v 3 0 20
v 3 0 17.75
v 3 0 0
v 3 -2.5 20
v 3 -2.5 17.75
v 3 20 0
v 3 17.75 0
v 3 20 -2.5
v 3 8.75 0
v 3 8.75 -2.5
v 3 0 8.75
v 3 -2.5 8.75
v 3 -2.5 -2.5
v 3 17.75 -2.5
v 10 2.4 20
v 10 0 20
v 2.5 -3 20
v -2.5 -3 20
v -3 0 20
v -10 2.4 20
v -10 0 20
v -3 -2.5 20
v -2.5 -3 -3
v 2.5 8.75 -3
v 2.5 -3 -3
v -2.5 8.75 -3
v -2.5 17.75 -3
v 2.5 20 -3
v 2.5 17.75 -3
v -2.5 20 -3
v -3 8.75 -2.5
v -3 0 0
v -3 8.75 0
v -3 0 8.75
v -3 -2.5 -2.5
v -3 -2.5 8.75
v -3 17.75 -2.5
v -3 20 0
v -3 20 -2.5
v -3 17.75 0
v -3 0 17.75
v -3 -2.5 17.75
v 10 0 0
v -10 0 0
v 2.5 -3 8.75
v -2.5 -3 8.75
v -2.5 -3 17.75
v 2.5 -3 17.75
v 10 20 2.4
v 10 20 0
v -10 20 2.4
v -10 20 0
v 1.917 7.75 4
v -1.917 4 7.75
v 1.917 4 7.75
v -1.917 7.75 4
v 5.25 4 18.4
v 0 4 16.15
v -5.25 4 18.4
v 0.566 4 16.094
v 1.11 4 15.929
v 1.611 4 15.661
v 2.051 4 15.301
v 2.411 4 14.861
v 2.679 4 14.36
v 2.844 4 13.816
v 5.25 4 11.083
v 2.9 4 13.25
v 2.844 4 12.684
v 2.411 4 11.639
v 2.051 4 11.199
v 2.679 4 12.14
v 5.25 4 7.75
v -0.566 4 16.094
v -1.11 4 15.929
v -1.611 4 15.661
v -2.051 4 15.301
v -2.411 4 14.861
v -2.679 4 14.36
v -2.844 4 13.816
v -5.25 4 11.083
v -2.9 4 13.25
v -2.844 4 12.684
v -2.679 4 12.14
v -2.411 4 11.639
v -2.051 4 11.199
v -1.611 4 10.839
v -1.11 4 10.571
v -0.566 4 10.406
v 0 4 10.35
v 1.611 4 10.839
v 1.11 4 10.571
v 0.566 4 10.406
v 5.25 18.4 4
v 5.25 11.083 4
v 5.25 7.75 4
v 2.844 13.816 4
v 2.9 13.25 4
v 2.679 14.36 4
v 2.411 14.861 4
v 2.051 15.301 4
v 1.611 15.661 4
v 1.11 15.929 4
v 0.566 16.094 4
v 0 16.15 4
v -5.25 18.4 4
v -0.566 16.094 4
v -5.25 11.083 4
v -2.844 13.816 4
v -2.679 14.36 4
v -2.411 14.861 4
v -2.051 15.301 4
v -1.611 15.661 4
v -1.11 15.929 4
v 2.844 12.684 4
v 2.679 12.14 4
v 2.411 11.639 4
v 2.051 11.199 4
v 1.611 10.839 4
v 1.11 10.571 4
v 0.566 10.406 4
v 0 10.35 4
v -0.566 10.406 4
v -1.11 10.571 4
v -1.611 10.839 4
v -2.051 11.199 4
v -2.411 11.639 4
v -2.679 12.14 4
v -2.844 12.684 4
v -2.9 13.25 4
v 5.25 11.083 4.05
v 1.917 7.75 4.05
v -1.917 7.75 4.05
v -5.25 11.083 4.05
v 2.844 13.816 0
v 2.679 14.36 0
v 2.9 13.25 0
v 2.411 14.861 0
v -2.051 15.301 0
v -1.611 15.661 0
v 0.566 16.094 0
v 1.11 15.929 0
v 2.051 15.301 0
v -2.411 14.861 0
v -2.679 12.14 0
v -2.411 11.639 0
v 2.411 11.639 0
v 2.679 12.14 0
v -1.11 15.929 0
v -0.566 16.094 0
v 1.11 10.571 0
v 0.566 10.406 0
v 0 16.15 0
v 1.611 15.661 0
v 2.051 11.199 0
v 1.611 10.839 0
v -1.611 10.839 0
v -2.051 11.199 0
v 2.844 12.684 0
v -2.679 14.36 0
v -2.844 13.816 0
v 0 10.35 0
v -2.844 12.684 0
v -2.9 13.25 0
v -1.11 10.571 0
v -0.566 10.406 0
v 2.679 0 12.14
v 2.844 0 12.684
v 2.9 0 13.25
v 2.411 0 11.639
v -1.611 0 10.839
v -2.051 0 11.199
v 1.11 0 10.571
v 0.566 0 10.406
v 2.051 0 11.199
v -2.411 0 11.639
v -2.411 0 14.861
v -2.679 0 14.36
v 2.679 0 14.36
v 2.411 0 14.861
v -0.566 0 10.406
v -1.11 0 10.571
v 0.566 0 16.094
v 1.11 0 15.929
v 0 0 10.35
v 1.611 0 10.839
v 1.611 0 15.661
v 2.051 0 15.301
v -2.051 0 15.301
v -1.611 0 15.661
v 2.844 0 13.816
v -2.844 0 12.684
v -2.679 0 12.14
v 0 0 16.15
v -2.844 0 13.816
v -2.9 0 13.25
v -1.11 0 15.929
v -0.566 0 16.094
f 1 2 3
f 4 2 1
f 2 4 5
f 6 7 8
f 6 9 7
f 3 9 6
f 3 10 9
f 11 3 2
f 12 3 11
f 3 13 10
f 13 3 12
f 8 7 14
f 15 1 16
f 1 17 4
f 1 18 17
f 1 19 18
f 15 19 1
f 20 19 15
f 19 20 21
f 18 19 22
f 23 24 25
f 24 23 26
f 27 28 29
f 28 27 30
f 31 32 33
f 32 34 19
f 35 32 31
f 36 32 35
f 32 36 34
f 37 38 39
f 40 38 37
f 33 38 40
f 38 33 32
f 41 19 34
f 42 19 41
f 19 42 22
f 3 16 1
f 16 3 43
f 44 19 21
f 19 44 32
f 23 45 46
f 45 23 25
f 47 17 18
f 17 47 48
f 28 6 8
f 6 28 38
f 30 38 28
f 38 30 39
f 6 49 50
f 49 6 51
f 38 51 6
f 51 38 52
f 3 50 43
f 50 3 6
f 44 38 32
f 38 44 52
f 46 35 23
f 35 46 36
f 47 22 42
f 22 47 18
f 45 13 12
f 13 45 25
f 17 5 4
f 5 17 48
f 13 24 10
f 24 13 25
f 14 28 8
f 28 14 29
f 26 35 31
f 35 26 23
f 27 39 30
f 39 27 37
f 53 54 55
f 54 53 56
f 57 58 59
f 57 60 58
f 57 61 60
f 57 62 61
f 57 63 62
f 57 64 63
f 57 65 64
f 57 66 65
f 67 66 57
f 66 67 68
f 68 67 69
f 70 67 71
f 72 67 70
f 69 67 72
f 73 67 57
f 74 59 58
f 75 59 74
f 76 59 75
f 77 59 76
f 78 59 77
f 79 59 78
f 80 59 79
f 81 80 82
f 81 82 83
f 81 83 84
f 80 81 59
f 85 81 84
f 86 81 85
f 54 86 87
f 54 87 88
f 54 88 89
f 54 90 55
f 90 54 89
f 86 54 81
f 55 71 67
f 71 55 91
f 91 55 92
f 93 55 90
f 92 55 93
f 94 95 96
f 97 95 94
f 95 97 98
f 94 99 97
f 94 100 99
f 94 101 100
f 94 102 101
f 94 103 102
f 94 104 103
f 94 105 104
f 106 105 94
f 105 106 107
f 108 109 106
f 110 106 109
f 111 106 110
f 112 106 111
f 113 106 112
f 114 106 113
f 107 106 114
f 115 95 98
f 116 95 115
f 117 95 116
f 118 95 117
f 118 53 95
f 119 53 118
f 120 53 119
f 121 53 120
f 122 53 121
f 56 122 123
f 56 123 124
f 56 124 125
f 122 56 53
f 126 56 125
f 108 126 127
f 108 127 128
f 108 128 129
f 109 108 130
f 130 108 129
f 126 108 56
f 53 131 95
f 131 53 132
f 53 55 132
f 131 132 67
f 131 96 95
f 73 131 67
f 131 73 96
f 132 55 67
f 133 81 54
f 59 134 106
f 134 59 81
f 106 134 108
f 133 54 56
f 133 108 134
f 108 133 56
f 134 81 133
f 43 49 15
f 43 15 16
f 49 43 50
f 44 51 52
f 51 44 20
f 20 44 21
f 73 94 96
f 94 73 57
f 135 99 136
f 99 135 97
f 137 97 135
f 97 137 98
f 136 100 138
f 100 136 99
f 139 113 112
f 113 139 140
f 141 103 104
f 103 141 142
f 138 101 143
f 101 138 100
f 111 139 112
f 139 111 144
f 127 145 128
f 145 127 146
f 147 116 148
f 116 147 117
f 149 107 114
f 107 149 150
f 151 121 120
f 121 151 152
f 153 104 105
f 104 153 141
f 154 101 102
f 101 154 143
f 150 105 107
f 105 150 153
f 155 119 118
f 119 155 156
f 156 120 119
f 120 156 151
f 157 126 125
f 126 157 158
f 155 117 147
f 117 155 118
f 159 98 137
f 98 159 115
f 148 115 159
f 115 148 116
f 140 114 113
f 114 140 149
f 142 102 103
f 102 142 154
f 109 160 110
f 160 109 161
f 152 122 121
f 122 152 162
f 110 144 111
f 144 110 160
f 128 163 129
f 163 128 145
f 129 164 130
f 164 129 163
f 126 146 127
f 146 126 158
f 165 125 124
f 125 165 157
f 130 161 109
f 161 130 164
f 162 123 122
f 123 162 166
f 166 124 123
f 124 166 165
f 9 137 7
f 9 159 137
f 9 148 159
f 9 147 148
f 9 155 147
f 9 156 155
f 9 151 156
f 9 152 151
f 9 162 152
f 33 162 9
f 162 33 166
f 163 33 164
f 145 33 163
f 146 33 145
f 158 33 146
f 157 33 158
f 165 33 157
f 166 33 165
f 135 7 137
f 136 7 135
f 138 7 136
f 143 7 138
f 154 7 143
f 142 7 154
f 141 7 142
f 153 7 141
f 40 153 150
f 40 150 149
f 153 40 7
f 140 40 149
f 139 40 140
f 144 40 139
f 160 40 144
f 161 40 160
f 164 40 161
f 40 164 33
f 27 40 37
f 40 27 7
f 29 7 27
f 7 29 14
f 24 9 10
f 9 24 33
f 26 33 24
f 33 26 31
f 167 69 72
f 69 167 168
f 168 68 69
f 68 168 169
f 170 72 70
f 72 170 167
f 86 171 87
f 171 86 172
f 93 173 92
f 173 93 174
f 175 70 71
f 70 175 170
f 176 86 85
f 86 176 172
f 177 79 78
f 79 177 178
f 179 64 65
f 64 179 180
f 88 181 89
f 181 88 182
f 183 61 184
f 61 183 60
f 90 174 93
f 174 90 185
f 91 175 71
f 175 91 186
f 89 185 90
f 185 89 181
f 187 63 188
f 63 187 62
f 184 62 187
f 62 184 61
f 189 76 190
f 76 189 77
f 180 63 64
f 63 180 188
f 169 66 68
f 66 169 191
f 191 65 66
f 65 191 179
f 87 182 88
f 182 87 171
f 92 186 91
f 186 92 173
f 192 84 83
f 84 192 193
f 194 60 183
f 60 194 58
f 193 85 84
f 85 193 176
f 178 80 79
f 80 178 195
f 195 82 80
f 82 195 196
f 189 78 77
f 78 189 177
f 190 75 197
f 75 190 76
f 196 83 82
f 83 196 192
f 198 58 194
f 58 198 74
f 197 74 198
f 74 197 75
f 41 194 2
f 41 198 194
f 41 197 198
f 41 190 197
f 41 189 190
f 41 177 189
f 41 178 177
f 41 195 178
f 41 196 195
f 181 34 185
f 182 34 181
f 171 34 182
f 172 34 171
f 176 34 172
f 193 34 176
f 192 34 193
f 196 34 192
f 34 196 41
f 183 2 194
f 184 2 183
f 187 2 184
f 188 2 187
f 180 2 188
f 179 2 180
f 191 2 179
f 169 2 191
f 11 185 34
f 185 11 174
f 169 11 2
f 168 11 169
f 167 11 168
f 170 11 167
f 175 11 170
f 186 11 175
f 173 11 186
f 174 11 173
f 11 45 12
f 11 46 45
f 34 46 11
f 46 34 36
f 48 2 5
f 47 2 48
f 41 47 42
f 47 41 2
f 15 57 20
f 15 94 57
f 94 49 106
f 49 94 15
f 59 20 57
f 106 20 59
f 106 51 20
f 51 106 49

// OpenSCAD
/*
* Ultimate Customizable Corner Brackets
* https://www.thingiverse.com/thing:3007147
* Version 1.1
* 2019-11-07
*/


// The width of your aluminium extrusion
extrusion_width = 20;

// The side length of the bracket
side_length = 20;
// The thickness of the parts you screw into
side_thickness = 4;

// How many screws should be used to fasten this to the extrusions. Should be even.
screw_count = 2;
// Screw diameter (4 for M4, 5 for M5 and so on)
screw_hole_size = 5;
// Screw head diameter
screw_head_size = 10;
// How deep screw heads should be recessed. Obviously don't make this larger than side_thickness.
recessed_screw_depth = 0;

// The part which goes into your extrusion. Generally this should be slightly smaller than the actual hole, but YMMV.
extrusion_insert_width = 6;

// Use this when you want multiple connected brackets, for 4020 and similar. 20 for 2020 extrusions, 30 for 3030 and so on.
extrusion_base = 20;

// Set to true if you only want a single wall. Not compatible with multiple bracket mode
single_wall_mode = false;

// Set lower if you think the side walls are too thick
max_wall_thickness = 8;

// Set this if you want to use these above your existing brackets. Typical 2020 brackets have a size of 20 and side thickness of 3
cutout_size = 0;
cutout_side_thickness = 0;
cutout_margin = 0.3;





/**********************************
   End of config, here be dragons
**********************************/








// This works for typical hammer nuts, increase if needed
bottom_nut_space = screw_hole_size + 4;

// You might want to decrease this if you don't use hammer nuts
extrusion_insert_height = 3;

screw_head_margin = 0.5;
e = 0.05;
screw_distance_from_edge = max(screw_head_size / 2 + 1.5, min(6.5, side_length/3)) + screw_head_margin/2;
bridge_size = screw_count > 2
    ? (side_length - side_thickness - 2*screw_head_size + cutout_size + cutout_margin) / (side_length/20)
    : side_length - screw_distance_from_edge - screw_head_size / 2 - side_thickness - screw_head_margin;

main();

module main() {
    bracket_count = floor(extrusion_width / extrusion_base);
    extrusion_width = extrusion_width/bracket_count;
    wall_thickness = min([max_wall_thickness, (extrusion_width - screw_head_size - screw_head_margin) / 2]);
    union() {
        for(i=[0:bracket_count-1]) {
            translate([i*extrusion_width, 0, 0]) bracket(extrusion_width, wall_thickness);
        }
    }
}

module bracket(width, wall_thickness, is_first) {
    screw_total_distance = side_length - screw_distance_from_edge - bridge_size - side_thickness - screw_head_size/2 - screw_head_margin;
    screw_distance = screw_total_distance/(max(1, screw_count/2-1));
    
    difference() {
        union() {
            translate([-width/2, 0, 0]) cube([width, side_length, side_thickness]); // Bottom wall
            translate([-width/2, side_thickness, 0]) rotate([90, 0, 0]) cube([width, side_length, side_thickness]); // Top wall
            translate([width/2 - wall_thickness, 0, 0]) rotate([90, 0, 90]) wall(width, side_length, wall_thickness); // Left wall
            if(!single_wall_mode) {
                translate([-width/2, 0, 0]) rotate([90, 0, 90]) wall(width, side_length, wall_thickness); // Right wall
            }
            
            // Make the parts which go into the extrusions, with chamfers
            difference() {
                union() {
                    extrusion_insert();
                    translate([0, 0, 0]) rotate([90, 0, 180]) extrusion_insert();
                }
                extrusion_chamfer();
                translate([0, 0, 0]) rotate([90, 0, 180]) extrusion_chamfer();
            }
            bridge(bridge_size, width, wall_thickness);
        };
        translate([-width/2 - e, side_length + side_thickness*0.6, 0]) rotate([45, 0, 0]) cube([width + e * 2, side_length, side_length*2]); // Cutoff for better printing
        
        // Make screw holes
        for(i=[0:screw_count/2-1]) {
            translate([0, side_length - screw_distance_from_edge - i*screw_distance, -e]) screw(screw_hole_size, screw_head_size); // Bottom screw
            translate([0, -e, side_length - screw_distance_from_edge - i*screw_distance]) rotate([270, 0, 0]) screw(screw_hole_size, screw_head_size); // Top screw
        }
        cutout();
    }
}

module cutout() {
    zero = -e-extrusion_insert_height;
    full_width = cutout_size+cutout_margin;
    if (cutout_size > 0) translate([extrusion_width/2+e, 0, 0]) rotate([0, -90, 0]) linear_extrude(height = extrusion_width+2*e, convexity = 2) polygon(points = [
        [zero, zero],
        [zero, full_width],
        [cutout_side_thickness+cutout_margin, full_width],
        [full_width, cutout_side_thickness+cutout_margin],
        [full_width, zero]]);
}

module wall(w, l, wall_thickness) {
    linear_extrude(height = wall_thickness, convexity = 2) polygon(points = [[side_thickness, side_thickness], [side_length, side_thickness], [side_thickness, side_length]]);
}

module screw(hole_size, head_size) {
    translate([0,0,-0.5]) cylinder(h = side_thickness + 1, r = hole_size / 2 + 0.4, $fn = 32); // Screw hole
    if(recessed_screw_depth > 0){
        translate([0, 0, side_thickness - recessed_screw_depth]) cylinder(h = recessed_screw_depth+1, r = (head_size + screw_head_margin)/2, $fn = 32);
    }
    translate([-extrusion_insert_width/2-e, -bottom_nut_space/2, -extrusion_insert_height-e]) cube([extrusion_insert_width + 2*e, bottom_nut_space,extrusion_insert_height+2*e]); // Remove extrusion insert below screw
    #translate([0, 0, side_thickness+2*e]) cylinder(h = 3, r = head_size / 2, $fn = 32); // Screw head, to make sure they don't hit each other
}

module bridge(size, width, wall_thickness) {
    right = width - 2*wall_thickness + 2;
    c = screw_head_size / 3;
    top = size + c;
    x = width/2-wall_thickness-c;
    union() {
        translate([width/2 - e, 0, 0])
            rotate([0, 270, 0])
            linear_extrude(height = width - 2*e, convexity = 2)
            polygon([[side_thickness, side_thickness], [side_thickness + size, side_thickness], [side_thickness, side_thickness + size]]); // Main bridge
        translate([width/2-wall_thickness-c, 0, 0])
            bridge_side(size, [[0, 0], [c, 0], [c, c]]); // Left
        if(!single_wall_mode) {
            translate([-width/2+wall_thickness, 0, 0])
                bridge_side(size, [[0, 0], [c, 0], [0, c]]); // Right
        }
    }
}

module bridge_side(size, polygon_points){
    hull() {
        translate([0, size+side_thickness, side_thickness]) linear_extrude(height = e, convexity = 2) polygon(points = polygon_points);
        translate([0, side_thickness, size+side_thickness]) rotate([90,0,0]) linear_extrude(height = e, convexity = 2) polygon(points = polygon_points);
    }
}

module extrusion_insert() {
    translate([-extrusion_insert_width/2, -extrusion_insert_height, -extrusion_insert_height]) cube([extrusion_insert_width, extrusion_insert_height, side_length + extrusion_insert_height]);
}

module extrusion_chamfer(height = .5) {
    x = extrusion_insert_width;
    z = side_length + extrusion_insert_height;
    length = sqrt(height * height * 2);
    translate([-extrusion_insert_width/2, -extrusion_insert_height, -extrusion_insert_height]) union() {
        translate([0, -height, -e]) rotate([0, 0, 45]) cube([length, length, z+2*e]);
        translate([x, -height, -e]) rotate([0, 0, 45]) cube([length, length, z+2*e]);
    }
}
